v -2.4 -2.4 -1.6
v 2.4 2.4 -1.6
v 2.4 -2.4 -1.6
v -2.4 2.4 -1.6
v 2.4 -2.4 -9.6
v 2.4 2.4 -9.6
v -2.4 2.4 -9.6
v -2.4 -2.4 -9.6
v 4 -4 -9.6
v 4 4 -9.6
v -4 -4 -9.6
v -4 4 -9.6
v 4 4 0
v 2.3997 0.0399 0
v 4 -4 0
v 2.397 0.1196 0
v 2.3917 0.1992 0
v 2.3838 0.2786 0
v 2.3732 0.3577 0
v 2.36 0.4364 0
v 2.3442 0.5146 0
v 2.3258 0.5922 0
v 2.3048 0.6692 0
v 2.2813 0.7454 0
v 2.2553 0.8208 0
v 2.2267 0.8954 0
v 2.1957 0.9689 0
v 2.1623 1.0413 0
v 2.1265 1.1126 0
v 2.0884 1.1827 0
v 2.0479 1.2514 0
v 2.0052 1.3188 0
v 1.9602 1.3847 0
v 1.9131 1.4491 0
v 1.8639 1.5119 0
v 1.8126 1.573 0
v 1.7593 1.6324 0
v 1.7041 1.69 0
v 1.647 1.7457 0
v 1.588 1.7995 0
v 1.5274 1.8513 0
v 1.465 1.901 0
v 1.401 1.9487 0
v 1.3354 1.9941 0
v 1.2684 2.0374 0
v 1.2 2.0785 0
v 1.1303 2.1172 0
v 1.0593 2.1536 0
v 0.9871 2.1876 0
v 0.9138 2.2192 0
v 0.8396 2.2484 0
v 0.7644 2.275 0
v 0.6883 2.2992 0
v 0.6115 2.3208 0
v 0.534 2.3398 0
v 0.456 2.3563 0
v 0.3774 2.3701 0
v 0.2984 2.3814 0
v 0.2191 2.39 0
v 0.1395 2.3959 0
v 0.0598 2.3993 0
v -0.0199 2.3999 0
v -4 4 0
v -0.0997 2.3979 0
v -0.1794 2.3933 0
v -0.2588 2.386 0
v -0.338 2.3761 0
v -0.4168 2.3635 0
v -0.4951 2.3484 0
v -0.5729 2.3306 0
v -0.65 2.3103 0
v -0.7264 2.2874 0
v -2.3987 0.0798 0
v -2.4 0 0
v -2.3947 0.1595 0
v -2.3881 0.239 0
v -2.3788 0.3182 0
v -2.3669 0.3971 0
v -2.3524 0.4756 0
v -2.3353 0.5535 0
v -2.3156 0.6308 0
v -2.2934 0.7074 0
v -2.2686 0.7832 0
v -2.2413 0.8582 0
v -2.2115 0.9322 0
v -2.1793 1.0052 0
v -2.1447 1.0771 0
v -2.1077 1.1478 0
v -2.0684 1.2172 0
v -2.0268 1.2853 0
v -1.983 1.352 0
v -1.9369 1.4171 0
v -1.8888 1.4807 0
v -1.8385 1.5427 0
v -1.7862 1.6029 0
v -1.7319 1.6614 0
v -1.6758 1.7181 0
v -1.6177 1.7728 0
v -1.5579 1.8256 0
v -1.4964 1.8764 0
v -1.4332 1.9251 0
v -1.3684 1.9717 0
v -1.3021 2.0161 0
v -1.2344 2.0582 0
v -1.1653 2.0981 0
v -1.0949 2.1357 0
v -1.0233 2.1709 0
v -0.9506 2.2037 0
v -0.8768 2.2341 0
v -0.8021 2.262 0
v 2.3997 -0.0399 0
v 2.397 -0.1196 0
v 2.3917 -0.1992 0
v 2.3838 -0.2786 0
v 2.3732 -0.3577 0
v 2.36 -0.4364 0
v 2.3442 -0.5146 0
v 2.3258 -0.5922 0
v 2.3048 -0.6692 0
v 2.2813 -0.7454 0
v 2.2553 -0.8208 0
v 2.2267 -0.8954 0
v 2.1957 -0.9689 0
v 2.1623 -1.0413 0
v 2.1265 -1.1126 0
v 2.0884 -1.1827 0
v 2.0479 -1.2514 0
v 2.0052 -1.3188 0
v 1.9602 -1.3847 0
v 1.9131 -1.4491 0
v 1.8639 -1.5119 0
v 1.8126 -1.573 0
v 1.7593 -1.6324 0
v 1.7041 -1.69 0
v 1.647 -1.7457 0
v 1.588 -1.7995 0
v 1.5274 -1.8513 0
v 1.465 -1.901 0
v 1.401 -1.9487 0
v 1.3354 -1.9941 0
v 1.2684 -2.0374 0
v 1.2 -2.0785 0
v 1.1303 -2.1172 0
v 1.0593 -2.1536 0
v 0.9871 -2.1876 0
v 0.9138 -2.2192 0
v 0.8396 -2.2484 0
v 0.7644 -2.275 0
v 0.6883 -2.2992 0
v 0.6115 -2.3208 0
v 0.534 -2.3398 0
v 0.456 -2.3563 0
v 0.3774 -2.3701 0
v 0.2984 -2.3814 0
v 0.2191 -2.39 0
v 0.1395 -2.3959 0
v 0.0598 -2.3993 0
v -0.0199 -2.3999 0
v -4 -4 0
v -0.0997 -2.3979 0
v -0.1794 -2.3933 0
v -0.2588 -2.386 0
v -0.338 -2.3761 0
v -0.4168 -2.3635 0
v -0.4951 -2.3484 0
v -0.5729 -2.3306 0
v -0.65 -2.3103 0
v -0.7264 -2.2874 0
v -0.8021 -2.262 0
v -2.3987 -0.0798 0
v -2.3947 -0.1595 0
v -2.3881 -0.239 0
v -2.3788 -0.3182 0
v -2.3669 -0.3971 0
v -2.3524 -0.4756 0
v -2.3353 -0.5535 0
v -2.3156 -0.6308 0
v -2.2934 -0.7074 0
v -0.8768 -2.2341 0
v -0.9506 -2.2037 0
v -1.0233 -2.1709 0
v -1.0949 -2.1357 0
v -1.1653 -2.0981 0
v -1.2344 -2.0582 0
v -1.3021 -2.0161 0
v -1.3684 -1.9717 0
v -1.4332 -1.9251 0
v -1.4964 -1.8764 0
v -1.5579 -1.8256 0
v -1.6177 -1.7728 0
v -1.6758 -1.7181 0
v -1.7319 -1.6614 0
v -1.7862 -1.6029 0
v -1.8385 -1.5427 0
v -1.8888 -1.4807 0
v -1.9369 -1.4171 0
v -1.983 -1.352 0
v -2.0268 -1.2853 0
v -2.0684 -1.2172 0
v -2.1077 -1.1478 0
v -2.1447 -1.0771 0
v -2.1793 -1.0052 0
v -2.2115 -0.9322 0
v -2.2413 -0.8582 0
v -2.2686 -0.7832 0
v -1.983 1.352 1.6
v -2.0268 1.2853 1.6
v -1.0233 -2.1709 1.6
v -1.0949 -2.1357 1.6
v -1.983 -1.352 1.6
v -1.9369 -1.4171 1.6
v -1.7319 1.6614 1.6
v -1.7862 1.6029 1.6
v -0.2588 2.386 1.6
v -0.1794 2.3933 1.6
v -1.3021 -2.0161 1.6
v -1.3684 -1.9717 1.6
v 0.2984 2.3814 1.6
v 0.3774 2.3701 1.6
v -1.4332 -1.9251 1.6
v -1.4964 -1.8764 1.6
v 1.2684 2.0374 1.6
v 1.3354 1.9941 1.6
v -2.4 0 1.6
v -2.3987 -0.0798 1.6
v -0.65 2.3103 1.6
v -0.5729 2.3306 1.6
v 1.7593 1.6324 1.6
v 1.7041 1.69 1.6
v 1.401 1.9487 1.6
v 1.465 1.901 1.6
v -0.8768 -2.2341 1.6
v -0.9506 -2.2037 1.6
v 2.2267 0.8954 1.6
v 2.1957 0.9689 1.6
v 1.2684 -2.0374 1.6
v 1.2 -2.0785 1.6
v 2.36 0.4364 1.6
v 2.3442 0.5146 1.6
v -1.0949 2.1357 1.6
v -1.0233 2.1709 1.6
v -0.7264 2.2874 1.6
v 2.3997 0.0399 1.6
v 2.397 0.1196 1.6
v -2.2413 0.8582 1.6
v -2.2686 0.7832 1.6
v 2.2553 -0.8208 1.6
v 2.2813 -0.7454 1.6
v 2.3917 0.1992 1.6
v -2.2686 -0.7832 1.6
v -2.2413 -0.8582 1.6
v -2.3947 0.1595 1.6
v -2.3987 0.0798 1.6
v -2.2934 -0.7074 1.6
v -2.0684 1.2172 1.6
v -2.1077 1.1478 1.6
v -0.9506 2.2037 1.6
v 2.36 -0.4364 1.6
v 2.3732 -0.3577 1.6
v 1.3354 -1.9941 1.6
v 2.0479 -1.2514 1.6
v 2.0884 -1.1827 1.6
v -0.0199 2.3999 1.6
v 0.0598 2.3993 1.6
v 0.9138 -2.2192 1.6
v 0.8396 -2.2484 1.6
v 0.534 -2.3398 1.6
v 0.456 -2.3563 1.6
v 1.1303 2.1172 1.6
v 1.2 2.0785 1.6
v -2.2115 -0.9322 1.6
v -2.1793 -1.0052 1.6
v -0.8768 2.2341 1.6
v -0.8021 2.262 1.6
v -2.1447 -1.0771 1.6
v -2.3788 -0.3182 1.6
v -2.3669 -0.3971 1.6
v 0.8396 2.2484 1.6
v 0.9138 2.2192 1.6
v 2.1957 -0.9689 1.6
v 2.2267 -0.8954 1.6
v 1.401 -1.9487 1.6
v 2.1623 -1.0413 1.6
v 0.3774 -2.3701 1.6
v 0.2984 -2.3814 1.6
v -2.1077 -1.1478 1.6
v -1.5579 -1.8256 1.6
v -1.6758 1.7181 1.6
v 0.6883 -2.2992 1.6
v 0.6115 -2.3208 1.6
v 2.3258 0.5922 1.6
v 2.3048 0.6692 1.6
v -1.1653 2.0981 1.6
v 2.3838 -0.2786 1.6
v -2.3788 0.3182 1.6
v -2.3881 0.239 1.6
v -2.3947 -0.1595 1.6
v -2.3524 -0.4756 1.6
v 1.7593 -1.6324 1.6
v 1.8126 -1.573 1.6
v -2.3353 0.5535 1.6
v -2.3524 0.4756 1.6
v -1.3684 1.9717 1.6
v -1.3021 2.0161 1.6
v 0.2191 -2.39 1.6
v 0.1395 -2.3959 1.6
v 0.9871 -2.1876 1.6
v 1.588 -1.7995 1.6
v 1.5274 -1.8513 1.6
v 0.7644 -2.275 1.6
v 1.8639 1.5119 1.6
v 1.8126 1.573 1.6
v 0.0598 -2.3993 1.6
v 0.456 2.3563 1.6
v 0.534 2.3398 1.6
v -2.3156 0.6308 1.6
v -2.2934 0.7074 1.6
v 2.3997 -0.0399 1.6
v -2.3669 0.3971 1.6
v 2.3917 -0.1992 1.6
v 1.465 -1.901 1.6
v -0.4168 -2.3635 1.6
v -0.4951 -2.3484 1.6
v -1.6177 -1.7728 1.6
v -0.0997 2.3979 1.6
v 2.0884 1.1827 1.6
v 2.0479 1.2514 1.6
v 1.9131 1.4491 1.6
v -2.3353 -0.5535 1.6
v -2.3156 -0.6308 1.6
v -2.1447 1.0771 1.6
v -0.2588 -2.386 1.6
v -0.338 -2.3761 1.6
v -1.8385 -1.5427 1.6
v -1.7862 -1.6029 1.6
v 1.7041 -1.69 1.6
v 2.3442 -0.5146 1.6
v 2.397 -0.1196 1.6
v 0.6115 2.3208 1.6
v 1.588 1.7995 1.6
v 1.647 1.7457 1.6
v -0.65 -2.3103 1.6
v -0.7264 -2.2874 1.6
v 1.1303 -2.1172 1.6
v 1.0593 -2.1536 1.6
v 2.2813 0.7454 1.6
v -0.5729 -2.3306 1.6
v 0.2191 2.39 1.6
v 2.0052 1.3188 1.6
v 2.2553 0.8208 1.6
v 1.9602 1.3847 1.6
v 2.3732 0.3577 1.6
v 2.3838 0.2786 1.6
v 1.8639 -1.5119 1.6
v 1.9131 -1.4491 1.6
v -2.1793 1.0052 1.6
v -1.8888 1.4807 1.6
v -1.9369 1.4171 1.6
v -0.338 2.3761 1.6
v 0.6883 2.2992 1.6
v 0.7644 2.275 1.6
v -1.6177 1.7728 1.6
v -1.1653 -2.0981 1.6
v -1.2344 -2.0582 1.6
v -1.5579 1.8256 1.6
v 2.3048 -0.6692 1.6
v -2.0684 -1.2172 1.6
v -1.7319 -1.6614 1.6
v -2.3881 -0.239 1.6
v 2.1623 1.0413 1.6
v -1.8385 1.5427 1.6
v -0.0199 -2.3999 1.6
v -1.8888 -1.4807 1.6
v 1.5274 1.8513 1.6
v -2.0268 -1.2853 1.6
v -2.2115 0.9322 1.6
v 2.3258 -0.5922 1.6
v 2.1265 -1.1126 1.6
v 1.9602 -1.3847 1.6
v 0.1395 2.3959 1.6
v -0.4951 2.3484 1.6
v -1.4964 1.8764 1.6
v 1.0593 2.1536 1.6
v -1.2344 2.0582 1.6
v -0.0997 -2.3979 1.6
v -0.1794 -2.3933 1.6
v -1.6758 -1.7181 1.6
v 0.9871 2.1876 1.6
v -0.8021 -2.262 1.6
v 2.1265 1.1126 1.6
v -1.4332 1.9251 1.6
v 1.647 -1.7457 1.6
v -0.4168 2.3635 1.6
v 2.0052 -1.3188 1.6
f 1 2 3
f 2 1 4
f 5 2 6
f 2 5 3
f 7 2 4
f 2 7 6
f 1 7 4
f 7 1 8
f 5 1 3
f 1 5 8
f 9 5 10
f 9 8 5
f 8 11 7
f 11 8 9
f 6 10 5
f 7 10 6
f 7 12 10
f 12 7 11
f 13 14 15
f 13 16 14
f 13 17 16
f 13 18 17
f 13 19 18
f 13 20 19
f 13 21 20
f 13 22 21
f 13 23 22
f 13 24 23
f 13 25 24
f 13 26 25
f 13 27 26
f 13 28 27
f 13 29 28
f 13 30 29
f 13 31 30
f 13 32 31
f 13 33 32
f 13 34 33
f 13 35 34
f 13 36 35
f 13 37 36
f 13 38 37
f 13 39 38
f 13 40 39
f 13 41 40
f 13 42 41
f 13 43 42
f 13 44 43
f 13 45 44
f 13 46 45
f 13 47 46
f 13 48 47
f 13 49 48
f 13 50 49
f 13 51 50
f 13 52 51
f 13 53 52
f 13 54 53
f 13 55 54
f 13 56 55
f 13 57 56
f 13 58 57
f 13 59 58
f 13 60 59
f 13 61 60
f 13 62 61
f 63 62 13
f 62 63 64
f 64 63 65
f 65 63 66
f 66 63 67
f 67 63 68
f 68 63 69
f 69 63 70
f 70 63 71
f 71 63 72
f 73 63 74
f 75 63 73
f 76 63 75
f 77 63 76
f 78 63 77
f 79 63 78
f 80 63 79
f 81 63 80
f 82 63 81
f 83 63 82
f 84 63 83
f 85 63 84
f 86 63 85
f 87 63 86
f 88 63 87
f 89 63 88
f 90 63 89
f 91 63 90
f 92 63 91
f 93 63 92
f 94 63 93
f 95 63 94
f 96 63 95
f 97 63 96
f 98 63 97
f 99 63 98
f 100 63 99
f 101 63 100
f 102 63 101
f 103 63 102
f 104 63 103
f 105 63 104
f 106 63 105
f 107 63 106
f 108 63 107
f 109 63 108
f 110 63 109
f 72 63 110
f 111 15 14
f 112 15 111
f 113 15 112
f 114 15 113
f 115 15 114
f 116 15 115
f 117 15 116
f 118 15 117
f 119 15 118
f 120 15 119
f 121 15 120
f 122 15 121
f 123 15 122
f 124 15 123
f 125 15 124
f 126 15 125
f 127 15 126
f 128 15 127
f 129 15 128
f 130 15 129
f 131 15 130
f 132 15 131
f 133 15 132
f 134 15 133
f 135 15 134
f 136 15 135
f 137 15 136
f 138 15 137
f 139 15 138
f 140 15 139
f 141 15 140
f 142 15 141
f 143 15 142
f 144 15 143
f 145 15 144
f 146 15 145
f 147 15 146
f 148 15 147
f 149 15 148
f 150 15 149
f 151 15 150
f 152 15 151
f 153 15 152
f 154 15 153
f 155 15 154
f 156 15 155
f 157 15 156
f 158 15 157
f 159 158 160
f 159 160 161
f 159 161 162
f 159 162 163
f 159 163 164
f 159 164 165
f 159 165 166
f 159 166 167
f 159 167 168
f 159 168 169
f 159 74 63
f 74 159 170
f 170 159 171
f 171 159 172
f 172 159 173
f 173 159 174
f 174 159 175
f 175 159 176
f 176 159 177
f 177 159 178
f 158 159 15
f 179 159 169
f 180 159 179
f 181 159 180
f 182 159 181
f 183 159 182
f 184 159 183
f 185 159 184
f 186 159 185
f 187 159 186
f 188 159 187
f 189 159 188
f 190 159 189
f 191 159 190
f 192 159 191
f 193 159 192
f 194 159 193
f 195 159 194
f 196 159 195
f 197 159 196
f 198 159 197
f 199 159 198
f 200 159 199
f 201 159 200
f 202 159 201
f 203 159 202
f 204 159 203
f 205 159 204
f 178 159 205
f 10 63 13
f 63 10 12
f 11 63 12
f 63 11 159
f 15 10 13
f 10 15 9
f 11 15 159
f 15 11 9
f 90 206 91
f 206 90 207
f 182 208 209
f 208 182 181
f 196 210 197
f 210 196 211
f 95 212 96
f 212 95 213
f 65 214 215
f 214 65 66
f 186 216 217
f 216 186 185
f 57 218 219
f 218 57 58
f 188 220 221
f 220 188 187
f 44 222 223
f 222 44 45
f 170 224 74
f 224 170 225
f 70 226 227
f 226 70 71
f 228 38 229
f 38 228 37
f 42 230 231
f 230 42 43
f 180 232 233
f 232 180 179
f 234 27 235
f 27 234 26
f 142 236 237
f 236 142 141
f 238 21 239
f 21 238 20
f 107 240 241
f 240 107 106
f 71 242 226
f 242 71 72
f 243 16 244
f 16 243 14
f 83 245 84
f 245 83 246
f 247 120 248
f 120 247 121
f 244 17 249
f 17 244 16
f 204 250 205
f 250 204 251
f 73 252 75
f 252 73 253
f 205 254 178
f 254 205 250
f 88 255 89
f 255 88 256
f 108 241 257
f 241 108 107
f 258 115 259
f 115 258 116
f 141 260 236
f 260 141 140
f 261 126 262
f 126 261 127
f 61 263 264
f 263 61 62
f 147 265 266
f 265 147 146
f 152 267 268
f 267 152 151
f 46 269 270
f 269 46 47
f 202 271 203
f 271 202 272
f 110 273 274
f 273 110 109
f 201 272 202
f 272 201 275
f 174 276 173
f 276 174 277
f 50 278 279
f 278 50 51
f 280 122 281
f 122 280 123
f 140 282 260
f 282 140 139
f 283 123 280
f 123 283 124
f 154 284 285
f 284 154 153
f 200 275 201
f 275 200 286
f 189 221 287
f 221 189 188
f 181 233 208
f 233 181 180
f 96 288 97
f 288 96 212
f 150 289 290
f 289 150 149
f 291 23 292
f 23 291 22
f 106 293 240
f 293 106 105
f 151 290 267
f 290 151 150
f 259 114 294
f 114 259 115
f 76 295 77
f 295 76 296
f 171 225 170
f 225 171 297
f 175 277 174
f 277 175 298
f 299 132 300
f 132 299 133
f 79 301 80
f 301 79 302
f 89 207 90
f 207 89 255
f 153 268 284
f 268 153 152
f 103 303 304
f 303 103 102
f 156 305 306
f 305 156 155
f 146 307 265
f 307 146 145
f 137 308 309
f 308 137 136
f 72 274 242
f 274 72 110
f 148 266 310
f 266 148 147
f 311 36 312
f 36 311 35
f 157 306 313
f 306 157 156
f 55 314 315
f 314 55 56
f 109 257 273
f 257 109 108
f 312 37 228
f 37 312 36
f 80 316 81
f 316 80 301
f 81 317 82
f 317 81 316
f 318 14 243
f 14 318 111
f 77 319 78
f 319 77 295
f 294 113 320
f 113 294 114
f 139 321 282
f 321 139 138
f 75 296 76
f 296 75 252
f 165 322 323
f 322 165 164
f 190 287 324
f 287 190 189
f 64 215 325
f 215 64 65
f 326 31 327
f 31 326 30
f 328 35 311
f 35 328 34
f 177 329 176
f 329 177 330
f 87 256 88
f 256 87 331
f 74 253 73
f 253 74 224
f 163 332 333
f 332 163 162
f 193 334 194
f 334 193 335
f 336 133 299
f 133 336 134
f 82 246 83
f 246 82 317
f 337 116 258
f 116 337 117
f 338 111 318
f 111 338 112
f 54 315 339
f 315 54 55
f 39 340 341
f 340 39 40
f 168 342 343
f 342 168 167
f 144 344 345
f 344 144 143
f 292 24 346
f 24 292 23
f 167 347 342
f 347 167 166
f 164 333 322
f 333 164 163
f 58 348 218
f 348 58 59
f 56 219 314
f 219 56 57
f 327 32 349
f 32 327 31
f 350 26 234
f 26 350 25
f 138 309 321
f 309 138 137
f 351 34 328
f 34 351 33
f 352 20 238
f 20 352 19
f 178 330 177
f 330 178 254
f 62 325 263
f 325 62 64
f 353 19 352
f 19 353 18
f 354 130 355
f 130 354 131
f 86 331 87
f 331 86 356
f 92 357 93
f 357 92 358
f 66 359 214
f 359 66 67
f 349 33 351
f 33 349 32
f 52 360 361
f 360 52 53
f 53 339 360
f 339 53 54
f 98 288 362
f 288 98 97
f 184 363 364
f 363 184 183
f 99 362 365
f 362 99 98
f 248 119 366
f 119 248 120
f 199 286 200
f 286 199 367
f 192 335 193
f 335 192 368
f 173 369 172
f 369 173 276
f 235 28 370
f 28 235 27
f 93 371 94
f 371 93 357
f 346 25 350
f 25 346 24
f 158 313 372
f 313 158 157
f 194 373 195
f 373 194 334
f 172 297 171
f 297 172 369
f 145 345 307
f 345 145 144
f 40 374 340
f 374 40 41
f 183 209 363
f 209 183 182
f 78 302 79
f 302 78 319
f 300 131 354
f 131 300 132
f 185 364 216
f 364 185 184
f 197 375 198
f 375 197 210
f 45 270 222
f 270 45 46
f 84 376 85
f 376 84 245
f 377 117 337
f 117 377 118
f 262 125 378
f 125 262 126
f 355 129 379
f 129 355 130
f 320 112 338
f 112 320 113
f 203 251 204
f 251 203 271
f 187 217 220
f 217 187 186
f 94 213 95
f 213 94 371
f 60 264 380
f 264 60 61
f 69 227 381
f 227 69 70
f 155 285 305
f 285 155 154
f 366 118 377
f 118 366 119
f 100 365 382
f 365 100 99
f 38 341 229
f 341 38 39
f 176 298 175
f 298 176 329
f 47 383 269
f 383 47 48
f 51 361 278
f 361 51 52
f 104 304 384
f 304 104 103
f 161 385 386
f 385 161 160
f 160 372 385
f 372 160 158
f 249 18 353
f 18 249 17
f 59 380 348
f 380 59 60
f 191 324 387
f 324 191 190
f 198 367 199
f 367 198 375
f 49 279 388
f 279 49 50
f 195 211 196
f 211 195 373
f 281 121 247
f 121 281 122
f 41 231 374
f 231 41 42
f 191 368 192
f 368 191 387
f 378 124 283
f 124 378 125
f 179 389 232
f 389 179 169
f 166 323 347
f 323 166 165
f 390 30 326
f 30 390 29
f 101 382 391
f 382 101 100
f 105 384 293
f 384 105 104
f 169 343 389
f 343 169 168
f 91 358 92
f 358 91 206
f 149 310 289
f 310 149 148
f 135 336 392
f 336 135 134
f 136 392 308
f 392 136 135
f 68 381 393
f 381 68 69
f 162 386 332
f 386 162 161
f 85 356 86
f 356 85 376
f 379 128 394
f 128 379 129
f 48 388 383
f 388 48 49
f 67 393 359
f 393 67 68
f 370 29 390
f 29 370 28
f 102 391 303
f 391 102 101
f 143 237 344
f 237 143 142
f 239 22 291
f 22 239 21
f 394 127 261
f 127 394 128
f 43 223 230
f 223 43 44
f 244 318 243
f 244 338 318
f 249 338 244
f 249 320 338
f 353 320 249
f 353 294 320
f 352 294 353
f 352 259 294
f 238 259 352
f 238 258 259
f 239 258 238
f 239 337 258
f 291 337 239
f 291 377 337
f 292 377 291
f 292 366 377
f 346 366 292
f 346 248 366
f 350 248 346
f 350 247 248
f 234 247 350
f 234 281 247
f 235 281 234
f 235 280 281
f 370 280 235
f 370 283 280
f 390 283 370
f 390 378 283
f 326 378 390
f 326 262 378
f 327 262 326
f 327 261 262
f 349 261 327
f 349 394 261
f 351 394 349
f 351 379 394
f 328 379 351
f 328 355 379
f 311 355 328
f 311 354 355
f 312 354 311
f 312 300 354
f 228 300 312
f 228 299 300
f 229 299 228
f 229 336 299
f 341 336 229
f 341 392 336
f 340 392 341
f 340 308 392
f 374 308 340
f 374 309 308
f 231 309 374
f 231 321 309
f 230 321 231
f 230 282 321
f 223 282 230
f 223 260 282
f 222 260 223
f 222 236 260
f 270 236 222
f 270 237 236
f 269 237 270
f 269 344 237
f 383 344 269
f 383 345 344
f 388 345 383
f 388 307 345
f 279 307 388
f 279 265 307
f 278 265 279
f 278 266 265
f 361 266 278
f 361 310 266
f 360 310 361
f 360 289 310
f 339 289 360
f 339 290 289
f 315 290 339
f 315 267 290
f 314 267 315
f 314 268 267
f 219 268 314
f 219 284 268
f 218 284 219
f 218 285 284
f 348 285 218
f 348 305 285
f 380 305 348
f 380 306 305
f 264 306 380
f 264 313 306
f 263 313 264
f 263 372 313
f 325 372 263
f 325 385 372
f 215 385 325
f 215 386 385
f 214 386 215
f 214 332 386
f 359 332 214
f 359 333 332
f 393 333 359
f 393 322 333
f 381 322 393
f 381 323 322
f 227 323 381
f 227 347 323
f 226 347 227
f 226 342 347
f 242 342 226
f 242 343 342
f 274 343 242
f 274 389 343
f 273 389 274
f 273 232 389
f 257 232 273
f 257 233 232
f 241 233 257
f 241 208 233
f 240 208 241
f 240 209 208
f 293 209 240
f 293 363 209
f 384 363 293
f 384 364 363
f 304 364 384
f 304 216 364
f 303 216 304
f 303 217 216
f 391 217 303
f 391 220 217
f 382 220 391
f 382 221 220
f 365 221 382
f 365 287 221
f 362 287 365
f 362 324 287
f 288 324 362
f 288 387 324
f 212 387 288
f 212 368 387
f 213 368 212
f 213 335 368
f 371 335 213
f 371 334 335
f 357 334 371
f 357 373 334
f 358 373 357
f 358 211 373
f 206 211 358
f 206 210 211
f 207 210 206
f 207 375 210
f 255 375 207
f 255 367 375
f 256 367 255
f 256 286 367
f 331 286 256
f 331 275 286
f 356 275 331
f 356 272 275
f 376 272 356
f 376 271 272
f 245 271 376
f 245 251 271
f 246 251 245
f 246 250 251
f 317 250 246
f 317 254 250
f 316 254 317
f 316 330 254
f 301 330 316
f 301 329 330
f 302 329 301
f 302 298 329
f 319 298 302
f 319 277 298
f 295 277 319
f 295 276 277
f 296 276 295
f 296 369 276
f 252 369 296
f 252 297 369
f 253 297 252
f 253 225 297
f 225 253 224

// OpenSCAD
// file: ../p/4-4edge.scad
use <../lib.scad>
$fa=1; $fs=0.2;
function ldraw_lib__4_4edge(realsolid=false) = [
// 0 Circle 1.0
// 0 Name: 4-4edge.dat
// 0 Author: James Jessiman
// 0 !LDRAW_ORG Primitive UPDATE 2017-01
// 0 !LICENSE Licensed under CC BY 2.0 and CC BY 4.0 : see CAreadme.txt
// 
// 0 BFC CERTIFY CCW
  [0,"BFC","CERTIFY"],
  [0,"BFC","CCW"],
// 
// 0 !HISTORY 1998-12-15 [PTadmin] Official Update 1998-10
// 0 !HISTORY 2005-12-28 [PTadmin] Official Update 2005-01
// 0 !HISTORY 2007-06-24 [PTadmin] Header formatted for Contributor Agreement
// 0 !HISTORY 2008-07-01 [PTadmin] Official Update 2008-01
// 0 !HISTORY 2017-01-15 [Steffen] BFCed
// 0 !HISTORY 2017-12-30 [PTadmin] Official Update 2017-01
// 
// 
// 2 24 1 0 0 0.9239 0 0.3827
  [2,24,1,0,0,0.9239,0,0.3827],
// 2 24 0.9239 0 0.3827 0.7071 0 0.7071
  [2,24,0.9239,0,0.3827,0.7071,0,0.7071],
// 2 24 0.7071 0 0.7071 0.3827 0 0.9239
  [2,24,0.7071,0,0.7071,0.3827,0,0.9239],
// 2 24 0.3827 0 0.9239 0 0 1
  [2,24,0.3827,0,0.9239,0,0,1],
// 2 24 0 0 1 -0.3827 0 0.9239
  [2,24,0,0,1,-0.3827,0,0.9239],
// 2 24 -0.3827 0 0.9239 -0.7071 0 0.7071
  [2,24,-0.3827,0,0.9239,-0.7071,0,0.7071],
// 2 24 -0.7071 0 0.7071 -0.9239 0 0.3827
  [2,24,-0.7071,0,0.7071,-0.9239,0,0.3827],
// 2 24 -0.9239 0 0.3827 -1 0 -0
  [2,24,-0.9239,0,0.3827,-1,0,-0],
// 2 24 -1 0 -0 -0.9239 0 -0.3827
  [2,24,-1,0,-0,-0.9239,0,-0.3827],
// 2 24 -0.9239 0 -0.3827 -0.7071 0 -0.7071
  [2,24,-0.9239,0,-0.3827,-0.7071,0,-0.7071],
// 2 24 -0.7071 0 -0.7071 -0.3827 0 -0.9239
  [2,24,-0.7071,0,-0.7071,-0.3827,0,-0.9239],
// 2 24 -0.3827 0 -0.9239 0 0 -1
  [2,24,-0.3827,0,-0.9239,0,0,-1],
// 2 24 0 0 -1 0.3827 0 -0.9239
  [2,24,0,0,-1,0.3827,0,-0.9239],
// 2 24 0.3827 0 -0.9239 0.7071 0 -0.7071
  [2,24,0.3827,0,-0.9239,0.7071,0,-0.7071],
// 2 24 0.7071 0 -0.7071 0.9239 0 -0.3827
  [2,24,0.7071,0,-0.7071,0.9239,0,-0.3827],
// 2 24 0.9239 0 -0.3827 1 0 0
  [2,24,0.9239,0,-0.3827,1,0,0],
];
module ldraw_lib__4_4edge(step=0, col=false, unit=2/5, alt=false, line=0.2, solid=!$preview)
    makepoly(ldraw_lib__4_4edge(solid), step=step, col=col, unit=unit, alt=alt, line=line, solid=solid);
ldraw_lib__4_4edge(line=0.2);
// file: ../p/4-4disc.scad
use <../lib.scad>
$fa=1; $fs=0.2;
function ldraw_lib__4_4disc(realsolid=false) = [
// 0 Disc 1.0
// 0 Name: 4-4disc.dat
// 0 Author: James Jessiman
// 0 !LDRAW_ORG Primitive UPDATE 2002-02
// 0 !LICENSE Licensed under CC BY 2.0 and CC BY 4.0 : see CAreadme.txt
// 
// 0 BFC CERTIFY CCW
  [0,"BFC","CERTIFY"],
  [0,"BFC","CCW"],
// 
// 0 !HISTORY 1998-12-15 [PTadmin] Official Update 1998-10
// 0 !HISTORY 2002-03-23 [sbliss] Added BFC statement
// 0 !HISTORY 2002-04-25 [PTadmin] Official Update 2002-02
// 0 !HISTORY 2007-06-24 [PTadmin] Header formatted for Contributor Agreement
// 0 !HISTORY 2008-07-01 [PTadmin] Official Update 2008-01
// 
// 
// 3 16 0 0 0 1 0 0 0.9239 0 0.3827
  [3,16,0,0,0,1,0,0,0.9239,0,0.3827],
// 3 16 0 0 0 0.9239 0 0.3827 0.7071 0 0.7071
  [3,16,0,0,0,0.9239,0,0.3827,0.7071,0,0.7071],
// 3 16 0 0 0 0.7071 0 0.7071 0.3827 0 0.9239
  [3,16,0,0,0,0.7071,0,0.7071,0.3827,0,0.9239],
// 3 16 0 0 0 0.3827 0 0.9239 0 0 1
  [3,16,0,0,0,0.3827,0,0.9239,0,0,1],
// 3 16 0 0 0 0 0 1 -0.3827 0 0.9239
  [3,16,0,0,0,0,0,1,-0.3827,0,0.9239],
// 3 16 0 0 0 -0.3827 0 0.9239 -0.7071 0 0.7071
  [3,16,0,0,0,-0.3827,0,0.9239,-0.7071,0,0.7071],
// 3 16 0 0 0 -0.7071 0 0.7071 -0.9239 0 0.3827
  [3,16,0,0,0,-0.7071,0,0.7071,-0.9239,0,0.3827],
// 3 16 0 0 0 -0.9239 0 0.3827 -1 0 -0
  [3,16,0,0,0,-0.9239,0,0.3827,-1,0,-0],
// 3 16 0 0 0 -1 0 -0 -0.9239 0 -0.3827
  [3,16,0,0,0,-1,0,-0,-0.9239,0,-0.3827],
// 3 16 0 0 0 -0.9239 0 -0.3827 -0.7071 0 -0.7071
  [3,16,0,0,0,-0.9239,0,-0.3827,-0.7071,0,-0.7071],
// 3 16 0 0 0 -0.7071 0 -0.7071 -0.3827 0 -0.9239
  [3,16,0,0,0,-0.7071,0,-0.7071,-0.3827,0,-0.9239],
// 3 16 0 0 0 -0.3827 0 -0.9239 0 0 -1
  [3,16,0,0,0,-0.3827,0,-0.9239,0,0,-1],
// 3 16 0 0 0 0 0 -1 0.3827 0 -0.9239
  [3,16,0,0,0,0,0,-1,0.3827,0,-0.9239],
// 3 16 0 0 0 0.3827 0 -0.9239 0.7071 0 -0.7071
  [3,16,0,0,0,0.3827,0,-0.9239,0.7071,0,-0.7071],
// 3 16 0 0 0 0.7071 0 -0.7071 0.9239 0 -0.3827
  [3,16,0,0,0,0.7071,0,-0.7071,0.9239,0,-0.3827],
// 3 16 0 0 0 0.9239 0 -0.3827 1 0 0
  [3,16,0,0,0,0.9239,0,-0.3827,1,0,0],
// 0
];
module ldraw_lib__4_4disc(step=0, col=false, unit=2/5, alt=false, line=0.2, solid=!$preview)
    makepoly(ldraw_lib__4_4disc(solid), step=step, col=col, unit=unit, alt=alt, line=line, solid=solid);
ldraw_lib__4_4disc(line=0.2);
// file: ../p/4-4cyli.scad
use <../lib.scad>
$fa=1; $fs=0.2;
function ldraw_lib__4_4cyli(realsolid=false) = [
// 0 Cylinder 1.0
// 0 Name: 4-4cyli.dat
// 0 Author: James Jessiman
// 0 !LDRAW_ORG Primitive UPDATE 2005-01
// 0 !LICENSE Licensed under CC BY 2.0 and CC BY 4.0 : see CAreadme.txt
// 
// 0 BFC CERTIFY CCW
  [0,"BFC","CERTIFY"],
  [0,"BFC","CCW"],
// 
// 0 !HISTORY 1998-12-15 [PTadmin] Official Update 1998-10
// 0 !HISTORY 2002-03-23 [sbliss] Added BFC statement; merged headers from files in distributions LDraw 0.27 and Complete.
// 0 !HISTORY 2002-04-25 [PTadmin] Official Update 2002-02
// 0 !HISTORY 2004-12-14 [guyvivan] BFC CCW
// 0 !HISTORY 2005-12-28 [PTadmin] Official Update 2005-01
// 0 !HISTORY 2007-06-24 [PTadmin] Header formatted for Contributor Agreement
// 0 !HISTORY 2008-07-01 [PTadmin] Official Update 2008-01
// 
// 
// 4 16 1 1 0 0.9239 1 0.3827 0.9239 0 0.3827 1 0 0
  [4,16,1,1,0,0.9239,1,0.3827,0.9239,0,0.3827,1,0,0],
// 5 24 1 0 0 1 1 0 0.9239 0 0.3827 0.9239 0 -0.3827
  [5,24,1,0,0,1,1,0,0.9239,0,0.3827,0.9239,0,-0.3827],
// 4 16 0.9239 1 0.3827 0.7071 1 0.7071 0.7071 0 0.7071 0.9239 0 0.3827
  [4,16,0.9239,1,0.3827,0.7071,1,0.7071,0.7071,0,0.7071,0.9239,0,0.3827],
// 5 24 0.9239 0 0.3827 0.9239 1 0.3827 0.7071 0 0.7071 1 0 0
  [5,24,0.9239,0,0.3827,0.9239,1,0.3827,0.7071,0,0.7071,1,0,0],
// 4 16 0.7071 1 0.7071 0.3827 1 0.9239 0.3827 0 0.9239 0.7071 0 0.7071
  [4,16,0.7071,1,0.7071,0.3827,1,0.9239,0.3827,0,0.9239,0.7071,0,0.7071],
// 5 24 0.7071 0 0.7071 0.7071 1 0.7071 0.3827 0 0.9239 0.9239 0 0.3827
  [5,24,0.7071,0,0.7071,0.7071,1,0.7071,0.3827,0,0.9239,0.9239,0,0.3827],
// 4 16 0.3827 1 0.9239 0 1 1 0 0 1 0.3827 0 0.9239
  [4,16,0.3827,1,0.9239,0,1,1,0,0,1,0.3827,0,0.9239],
// 5 24 0.3827 0 0.9239 0.3827 1 0.9239 0 0 1 0.7071 0 0.7071
  [5,24,0.3827,0,0.9239,0.3827,1,0.9239,0,0,1,0.7071,0,0.7071],
// 4 16 0 1 1 -0.3827 1 0.9239 -0.3827 0 0.9239 0 0 1
  [4,16,0,1,1,-0.3827,1,0.9239,-0.3827,0,0.9239,0,0,1],
// 5 24 0 0 1 0 1 1 -0.3827 0 0.9239 0.3827 0 0.9239
  [5,24,0,0,1,0,1,1,-0.3827,0,0.9239,0.3827,0,0.9239],
// 4 16 -0.3827 1 0.9239 -0.7071 1 0.7071 -0.7071 0 0.7071 -0.3827 0 0.9239
  [4,16,-0.3827,1,0.9239,-0.7071,1,0.7071,-0.7071,0,0.7071,-0.3827,0,0.9239],
// 5 24 -0.3827 0 0.9239 -0.3827 1 0.9239 -0.7071 0 0.7071 0 0 1
  [5,24,-0.3827,0,0.9239,-0.3827,1,0.9239,-0.7071,0,0.7071,0,0,1],
// 4 16 -0.7071 1 0.7071 -0.9239 1 0.3827 -0.9239 0 0.3827 -0.7071 0 0.7071
  [4,16,-0.7071,1,0.7071,-0.9239,1,0.3827,-0.9239,0,0.3827,-0.7071,0,0.7071],
// 5 24 -0.7071 0 0.7071 -0.7071 1 0.7071 -0.9239 0 0.3827 -0.3827 0 0.9239
  [5,24,-0.7071,0,0.7071,-0.7071,1,0.7071,-0.9239,0,0.3827,-0.3827,0,0.9239],
// 4 16 -0.9239 1 0.3827 -1 1 0 -1 0 0 -0.9239 0 0.3827
  [4,16,-0.9239,1,0.3827,-1,1,0,-1,0,0,-0.9239,0,0.3827],
// 5 24 -0.9239 0 0.3827 -0.9239 1 0.3827 -1 0 0 -0.7071 0 0.7071
  [5,24,-0.9239,0,0.3827,-0.9239,1,0.3827,-1,0,0,-0.7071,0,0.7071],
// 4 16 -1 1 0 -0.9239 1 -0.3827 -0.9239 0 -0.3827 -1 0 0
  [4,16,-1,1,0,-0.9239,1,-0.3827,-0.9239,0,-0.3827,-1,0,0],
// 5 24 -1 0 0 -1 1 0 -0.9239 0 -0.3827 -0.9239 0 0.3827
  [5,24,-1,0,0,-1,1,0,-0.9239,0,-0.3827,-0.9239,0,0.3827],
// 4 16 -0.9239 1 -0.3827 -0.7071 1 -0.7071 -0.7071 0 -0.7071 -0.9239 0 -0.3827
  [4,16,-0.9239,1,-0.3827,-0.7071,1,-0.7071,-0.7071,0,-0.7071,-0.9239,0,-0.3827],
// 5 24 -0.9239 0 -0.3827 -0.9239 1 -0.3827 -0.7071 0 -0.7071 -1 0 0
  [5,24,-0.9239,0,-0.3827,-0.9239,1,-0.3827,-0.7071,0,-0.7071,-1,0,0],
// 4 16 -0.7071 1 -0.7071 -0.3827 1 -0.9239 -0.3827 0 -0.9239 -0.7071 0 -0.7071
  [4,16,-0.7071,1,-0.7071,-0.3827,1,-0.9239,-0.3827,0,-0.9239,-0.7071,0,-0.7071],
// 5 24 -0.7071 0 -0.7071 -0.7071 1 -0.7071 -0.3827 0 -0.9239 -0.9239 0 -0.3827
  [5,24,-0.7071,0,-0.7071,-0.7071,1,-0.7071,-0.3827,0,-0.9239,-0.9239,0,-0.3827],
// 4 16 -0.3827 1 -0.9239 0 1 -1 0 0 -1 -0.3827 0 -0.9239
  [4,16,-0.3827,1,-0.9239,0,1,-1,0,0,-1,-0.3827,0,-0.9239],
// 5 24 -0.3827 0 -0.9239 -0.3827 1 -0.9239 0 0 -1 -0.7071 0 -0.7071
  [5,24,-0.3827,0,-0.9239,-0.3827,1,-0.9239,0,0,-1,-0.7071,0,-0.7071],
// 4 16 0 1 -1 0.3827 1 -0.9239 0.3827 0 -0.9239 0 0 -1
  [4,16,0,1,-1,0.3827,1,-0.9239,0.3827,0,-0.9239,0,0,-1],
// 5 24 0 0 -1 0 1 -1 0.3827 0 -0.9239 -0.3827 0 -0.9239
  [5,24,0,0,-1,0,1,-1,0.3827,0,-0.9239,-0.3827,0,-0.9239],
// 4 16 0.3827 1 -0.9239 0.7071 1 -0.7071 0.7071 0 -0.7071 0.3827 0 -0.9239
  [4,16,0.3827,1,-0.9239,0.7071,1,-0.7071,0.7071,0,-0.7071,0.3827,0,-0.9239],
// 5 24 0.3827 0 -0.9239 0.3827 1 -0.9239 0.7071 0 -0.7071 0 0 -1
  [5,24,0.3827,0,-0.9239,0.3827,1,-0.9239,0.7071,0,-0.7071,0,0,-1],
// 4 16 0.7071 1 -0.7071 0.9239 1 -0.3827 0.9239 0 -0.3827 0.7071 0 -0.7071
  [4,16,0.7071,1,-0.7071,0.9239,1,-0.3827,0.9239,0,-0.3827,0.7071,0,-0.7071],
// 5 24 0.7071 0 -0.7071 0.7071 1 -0.7071 0.9239 0 -0.3827 0.3827 0 -0.9239
  [5,24,0.7071,0,-0.7071,0.7071,1,-0.7071,0.9239,0,-0.3827,0.3827,0,-0.9239],
// 4 16 0.9239 1 -0.3827 1 1 0 1 0 0 0.9239 0 -0.3827
  [4,16,0.9239,1,-0.3827,1,1,0,1,0,0,0.9239,0,-0.3827],
// 5 24 0.9239 0 -0.3827 0.9239 1 -0.3827 1 0 0 0.7071 0 -0.7071
  [5,24,0.9239,0,-0.3827,0.9239,1,-0.3827,1,0,0,0.7071,0,-0.7071],
// 0
];
module ldraw_lib__4_4cyli(step=0, col=false, unit=2/5, alt=false, line=0.2, solid=!$preview)
    makepoly(ldraw_lib__4_4cyli(solid), step=step, col=col, unit=unit, alt=alt, line=line, solid=solid);
ldraw_lib__4_4cyli(line=0.2);
// file: ../p/stud3.scad
use <../lib.scad>
use <4-4cyli.scad>
use <4-4disc.scad>
use <4-4edge.scad>
$fa=1; $fs=0.2;
function ldraw_lib__stud3(realsolid=false) = realsolid ? 
    [openscad(translate([0,0,-eps()], o=cylinder(4+eps(), r=4)),2)] : [
// 0 Stud Tube Solid
// 0 Name: stud3.dat
// 0 Author: James Jessiman
// 0 !LDRAW_ORG Primitive UPDATE 2012-01
// 0 !LICENSE Licensed under CC BY 2.0 and CC BY 4.0 : see CAreadme.txt
// 
// 0 BFC CERTIFY CCW
  [0,"BFC","CERTIFY"],
  [0,"BFC","CCW"],
// 
// 0 !HISTORY 2002-04-04 [sbliss] Modified for BFC compliance
// 0 !HISTORY 2002-04-25 [PTadmin] Official Update 2002-02
// 0 !HISTORY 2007-06-24 [PTadmin] Header formatted for Contributor Agreement
// 0 !HISTORY 2008-07-01 [PTadmin] Official Update 2008-01
// 0 !HISTORY 2012-02-16 [Philo] Changed to CCW
// 0 !HISTORY 2012-03-30 [PTadmin] Official Update 2012-01
// 
// 
// 1 16 0 -4 0 4 0 0 0 1 0 0 0 4 4-4edge.dat
  [1,16,0,-4,0,4,0,0,0,1,0,0,0,4, ldraw_lib__4_4edge(realsolid)],
// 1 16 0 0 0 4 0 0 0 1 0 0 0 4 4-4edge.dat
  [1,16,0,0,0,4,0,0,0,1,0,0,0,4, ldraw_lib__4_4edge(realsolid)],
// 1 16 0 -4 0 4 0 0 0 1 0 0 0 4 4-4disc.dat
  [1,16,0,-4,0,4,0,0,0,1,0,0,0,4, ldraw_lib__4_4disc(realsolid)],
// 1 16 0 -4 0 4 0 0 0 4 0 0 0 4 4-4cyli.dat
  [1,16,0,-4,0,4,0,0,0,4,0,0,0,4, ldraw_lib__4_4cyli(realsolid)],
];
module ldraw_lib__stud3(step=0, col=false, unit=2/5, alt=false, line=0.2, solid=!$preview)
    makepoly(ldraw_lib__stud3(solid), step=step, col=col, unit=unit, alt=alt, line=line, solid=solid);
ldraw_lib__stud3(line=0.2);
// file: ../p/stud.scad
use <../lib.scad>
use <4-4cyli.scad>
use <4-4disc.scad>
use <4-4edge.scad>
$fa=1; $fs=0.2;
function ldraw_lib__stud(realsolid=false) = realsolid ? 
    [openscad(translate([0,0,-eps()], o=cylinder(4+eps(), r=6)),2)] : [
// 0 Stud
// 0 Name: stud.dat
// 0 Author: James Jessiman
// 0 !LDRAW_ORG Primitive UPDATE 2012-01
// 0 !LICENSE Licensed under CC BY 2.0 and CC BY 4.0 : see CAreadme.txt
// 
// 0 BFC CERTIFY CCW
  [0,"BFC","CERTIFY"],
  [0,"BFC","CCW"],
// 
// 0 !HISTORY 2002-04-04 [sbliss] Modified for BFC compliance
// 0 !HISTORY 2002-04-25 [PTadmin] Official Update 2002-02
// 0 !HISTORY 2007-06-24 [PTadmin] Header formatted for Contributor Agreement
// 0 !HISTORY 2008-07-01 [PTadmin] Official Update 2008-01
// 0 !HISTORY 2012-02-16 [Philo] Changed to CCW
// 0 !HISTORY 2012-03-30 [PTadmin] Official Update 2012-01
// 
// 
// 1 16 0 0 0 6 0 0 0 1 0 0 0 6 4-4edge.dat
  [1,16,0,0,0,6,0,0,0,1,0,0,0,6, ldraw_lib__4_4edge(realsolid)],
// 1 16 0 -4 0 6 0 0 0 1 0 0 0 6 4-4edge.dat
  [1,16,0,-4,0,6,0,0,0,1,0,0,0,6, ldraw_lib__4_4edge(realsolid)],
// 1 16 0 0 0 6 0 0 0 -4 0 0 0 6 4-4cyli.dat
  [1,16,0,0,0,6,0,0,0,-4,0,0,0,6, ldraw_lib__4_4cyli(realsolid)],
// 1 16 0 -4 0 6 0 0 0 1 0 0 0 6 4-4disc.dat
  [1,16,0,-4,0,6,0,0,0,1,0,0,0,6, ldraw_lib__4_4disc(realsolid)],
];
module ldraw_lib__stud(step=0, col=false, unit=2/5, alt=false, line=0.2, solid=!$preview)
    makepoly(ldraw_lib__stud(solid), step=step, col=col, unit=unit, alt=alt, line=line, solid=solid);
ldraw_lib__stud(line=0.2);
// file: ../p/box5.scad
use <../lib.scad>
$fa=1; $fs=0.2;
function ldraw_lib__box5(realsolid=false) = [
// 0 Box with 5 Faces and All Edges
// 0 Name: box5.dat
// 0 Author: James Jessiman
// 0 !LDRAW_ORG Primitive UPDATE 2012-01
// 0 !LICENSE Licensed under CC BY 2.0 and CC BY 4.0 : see CAreadme.txt
// 
// 0 BFC CERTIFY CCW
  [0,"BFC","CERTIFY"],
  [0,"BFC","CCW"],
// 
// 0 !HISTORY 2002-04-03 [sbliss] Modified for BFC compliance
// 0 !HISTORY 2002-04-25 [PTadmin] Official Update 2002-02
// 0 !HISTORY 2007-06-24 [PTadmin] Header formatted for Contributor Agreement
// 0 !HISTORY 2008-07-01 [PTadmin] Official Update 2008-01
// 0 !HISTORY 2012-02-16 [Philo] Changed to CCW
// 0 !HISTORY 2012-03-30 [PTadmin] Official Update 2012-01
// 
// 
// 2 24 1 1 1 -1 1 1
  [2,24,1,1,1,-1,1,1],
// 2 24 -1 1 1 -1 1 -1
  [2,24,-1,1,1,-1,1,-1],
// 2 24 -1 1 -1 1 1 -1
  [2,24,-1,1,-1,1,1,-1],
// 2 24 1 1 -1 1 1 1
  [2,24,1,1,-1,1,1,1],
// 2 24 1 0 1 -1 0 1
  [2,24,1,0,1,-1,0,1],
// 2 24 -1 0 1 -1 0 -1
  [2,24,-1,0,1,-1,0,-1],
// 2 24 -1 0 -1 1 0 -1
  [2,24,-1,0,-1,1,0,-1],
// 2 24 1 0 -1 1 0 1
  [2,24,1,0,-1,1,0,1],
// 2 24 1 0 1 1 1 1
  [2,24,1,0,1,1,1,1],
// 2 24 -1 0 1 -1 1 1
  [2,24,-1,0,1,-1,1,1],
// 2 24 1 0 -1 1 1 -1
  [2,24,1,0,-1,1,1,-1],
// 2 24 -1 0 -1 -1 1 -1
  [2,24,-1,0,-1,-1,1,-1],
// 4 16 -1 1 1 1 1 1 1 1 -1 -1 1 -1
  [4,16,-1,1,1,1,1,1,1,1,-1,-1,1,-1],
// 4 16 -1 1 1 -1 0 1 1 0 1 1 1 1
  [4,16,-1,1,1,-1,0,1,1,0,1,1,1,1],
// 4 16 -1 1 -1 -1 0 -1 -1 0 1 -1 1 1
  [4,16,-1,1,-1,-1,0,-1,-1,0,1,-1,1,1],
// 4 16 1 1 -1 1 0 -1 -1 0 -1 -1 1 -1
  [4,16,1,1,-1,1,0,-1,-1,0,-1,-1,1,-1],
// 4 16 1 1 1 1 0 1 1 0 -1 1 1 -1
  [4,16,1,1,1,1,0,1,1,0,-1,1,1,-1],
];
module ldraw_lib__box5(step=0, col=false, unit=2/5, alt=false, line=0.2, solid=!$preview)
    makepoly(ldraw_lib__box5(solid), step=step, col=col, unit=unit, alt=alt, line=line, solid=solid);
ldraw_lib__box5(line=0.2);
// file: ../p/box4t.scad
use <../lib.scad>
$fa=1; $fs=0.2;
function ldraw_lib__box4t(realsolid=false) = [
// 0 Box with 4 Adjacent Faces and All Edges
// 0 Name: box4t.dat
// 0 Author: Tore Eriksson [Tore_Eriksson]
// 0 !LDRAW_ORG Primitive UPDATE 2003-02
// 0 !LICENSE Licensed under CC BY 2.0 and CC BY 4.0 : see CAreadme.txt
// 
// 0 BFC CERTIFY CCW
  [0,"BFC","CERTIFY"],
  [0,"BFC","CCW"],
// 
// 0 !HISTORY 1997-09-29 [PTadmin] Official Update 1997-15
// 0 !HISTORY 2002-08-31 [izanette] Modified with WINDZ for BFC compliance
// 0 !HISTORY 2003-08-01 [PTadmin] Official Update 2003-02
// 0 !HISTORY 2007-06-24 [PTadmin] Header formatted for Contributor Agreement
// 0 !HISTORY 2008-07-01 [PTadmin] Official Update 2008-01
// 
// 
// 2 24 1 1 1 -1 1 1
  [2,24,1,1,1,-1,1,1],
// 2 24 -1 1 1 -1 1 -1
  [2,24,-1,1,1,-1,1,-1],
// 2 24 -1 1 -1 1 1 -1
  [2,24,-1,1,-1,1,1,-1],
// 2 24 1 1 -1 1 1 1
  [2,24,1,1,-1,1,1,1],
// 2 24 1 0 1 -1 0 1
  [2,24,1,0,1,-1,0,1],
// 2 24 -1 0 1 -1 0 -1
  [2,24,-1,0,1,-1,0,-1],
// 2 24 -1 0 -1 1 0 -1
  [2,24,-1,0,-1,1,0,-1],
// 2 24 1 0 -1 1 0 1
  [2,24,1,0,-1,1,0,1],
// 2 24 1 0 1 1 1 1
  [2,24,1,0,1,1,1,1],
// 2 24 -1 0 1 -1 1 1
  [2,24,-1,0,1,-1,1,1],
// 2 24 1 0 -1 1 1 -1
  [2,24,1,0,-1,1,1,-1],
// 2 24 -1 0 -1 -1 1 -1
  [2,24,-1,0,-1,-1,1,-1],
// 4 16 1 1 1 1 1 -1 -1 1 -1 -1 1 1
  [4,16,1,1,1,1,1,-1,-1,1,-1,-1,1,1],
// 4 16 1 1 1 -1 1 1 -1 0 1 1 0 1
  [4,16,1,1,1,-1,1,1,-1,0,1,1,0,1],
// 4 16 -1 1 1 -1 1 -1 -1 0 -1 -1 0 1
  [4,16,-1,1,1,-1,1,-1,-1,0,-1,-1,0,1],
// 0 4 16 -1 1 -1 -1 0 -1 1 0 -1 1 1 -1
// 4 16 1 1 -1 1 1 1 1 0 1 1 0 -1
  [4,16,1,1,-1,1,1,1,1,0,1,1,0,-1],
// 0
];
module ldraw_lib__box4t(step=0, col=false, unit=2/5, alt=false, line=0.2, solid=!$preview)
    makepoly(ldraw_lib__box4t(solid), step=step, col=col, unit=unit, alt=alt, line=line, solid=solid);
ldraw_lib__box4t(line=0.2);
// file: s/3004s01.scad
use <../../lib.scad>
use <../../p/box4t.scad>
use <../../p/box5.scad>
use <../../p/stud.scad>
use <../../p/stud3.scad>
$fa=1; $fs=0.2;
function ldraw_lib__s__3004s01(realsolid=false) = [
// 0 ~Brick  1 x  2 without Front Face
// 0 Name: s\3004s01.dat
// 0 Author: James Jessiman
// 0 !LDRAW_ORG Subpart UPDATE 2003-03
// 0 !LICENSE Licensed under CC BY 2.0 and CC BY 4.0 : see CAreadme.txt
// 
// 0 BFC CERTIFY CCW
  [0,"BFC","CERTIFY"],
  [0,"BFC","CCW"],
// 
// 0 !HISTORY 2003-09-07 [jriley] Subfiling, BFC
// 0 !HISTORY 2003-12-19 [PTadmin] Official Update 2003-03
// 0 !HISTORY 2007-08-29 [PTadmin] Header formatted for Contributor Agreement
// 0 !HISTORY 2008-07-01 [PTadmin] Official Update 2008-01
// 
// 
// 1 16 0 4 0 1 0 0 0 -5 0 0 0 1 stud3.dat
  [1,16,0,4,0,1,0,0,0,-5,0,0,0,1, ldraw_lib__stud3(realsolid)],
// 0 BFC INVERTNEXT
  [0,"BFC","INVERTNEXT"],
// 1 16 0 24 0 16 0 0 0 -20 0 0 0 6 box5.dat
  [1,16,0,24,0,16,0,0,0,-20,0,0,0,6, ldraw_lib__box5(realsolid)],
// 4 16 20 24 10 16 24 6 -16 24 6 -20 24 10
  [4,16,20,24,10,16,24,6,-16,24,6,-20,24,10],
// 4 16 -20 24 10 -16 24 6 -16 24 -6 -20 24 -10
  [4,16,-20,24,10,-16,24,6,-16,24,-6,-20,24,-10],
// 4 16 -20 24 -10 -16 24 -6 16 24 -6 20 24 -10
  [4,16,-20,24,-10,-16,24,-6,16,24,-6,20,24,-10],
// 4 16 20 24 -10 16 24 -6 16 24 6 20 24 10
  [4,16,20,24,-10,16,24,-6,16,24,6,20,24,10],
// 1 16 0 24 0 20 0 0 0 -24 0 0 0 10 box4t.dat
  [1,16,0,24,0,20,0,0,0,-24,0,0,0,10, ldraw_lib__box4t(realsolid)],
// 1 16 10 0 0 1 0 0 0 1 0 0 0 1 stud.dat
  [1,16,10,0,0,1,0,0,0,1,0,0,0,1, ldraw_lib__stud(realsolid)],
// 1 16 -10 0 0 1 0 0 0 1 0 0 0 1 stud.dat
  [1,16,-10,0,0,1,0,0,0,1,0,0,0,1, ldraw_lib__stud(realsolid)],
// 0
];
module ldraw_lib__s__3004s01(step=0, col=false, unit=2/5, alt=false, line=0.2, solid=!$preview)
    makepoly(ldraw_lib__s__3004s01(solid), step=step, col=col, unit=unit, alt=alt, line=line, solid=solid);
ldraw_lib__s__3004s01(line=0.2);
// file: s/3005s01.scad
use <../../lib.scad>
use <../../p/box4t.scad>
use <../../p/box5.scad>
use <../../p/stud.scad>
$fa=1; $fs=0.2;
function ldraw_lib__s__3005s01(realsolid=false) = [
// 0 ~Brick  1 x  1 without Front Face
// 0 Name: s\3005s01.dat
// 0 Author: John Riley [jriley]
// 0 !LDRAW_ORG Subpart UPDATE 2004-01
// 0 !LICENSE Licensed under CC BY 2.0 and CC BY 4.0 : see CAreadme.txt
// 
// 0 BFC CERTIFY CCW
  [0,"BFC","CERTIFY"],
  [0,"BFC","CCW"],
// 
// 0 !HISTORY 2003-09-07 [jriley] BFCed & Subfiled
// 0 !HISTORY 2004-03-02 [PTadmin] Official Update 2004-01
// 0 !HISTORY 2007-08-29 [PTadmin] Header formatted for Contributor Agreement
// 0 !HISTORY 2008-07-01 [PTadmin] Official Update 2008-01
// 
// 
// 0 BFC INVERTNEXT
  [0,"BFC","INVERTNEXT"],
// 1 16 0 24 0 0 0 6 0 -20 0 -6 0 0 box5.dat
  [1,16,0,24,0,0,0,6,0,-20,0,-6,0,0, ldraw_lib__box5(realsolid)],
// 4 16 10 24 -10 6 24 -6 6 24 6 10 24 10
  [4,16,10,24,-10,6,24,-6,6,24,6,10,24,10],
// 4 16 10 24 10 6 24 6 -6 24 6 -10 24 10
  [4,16,10,24,10,6,24,6,-6,24,6,-10,24,10],
// 4 16 -10 24 10 -6 24 6 -6 24 -6 -10 24 -10
  [4,16,-10,24,10,-6,24,6,-6,24,-6,-10,24,-10],
// 4 16 -10 24 -10 -6 24 -6 6 24 -6 10 24 -10
  [4,16,-10,24,-10,-6,24,-6,6,24,-6,10,24,-10],
// 1 16 0 24 0 10 0 0 0 -24 0 0 0 10 box4t.dat
  [1,16,0,24,0,10,0,0,0,-24,0,0,0,10, ldraw_lib__box4t(realsolid)],
// 1 16 0 0 0 0 0 1 0 1 0 -1 0 0 stud.dat
  [1,16,0,0,0,0,0,1,0,1,0,-1,0,0, ldraw_lib__stud(realsolid)],
// 0
];
module ldraw_lib__s__3005s01(step=0, col=false, unit=2/5, alt=false, line=0.2, solid=!$preview)
    makepoly(ldraw_lib__s__3005s01(solid), step=step, col=col, unit=unit, alt=alt, line=line, solid=solid);
ldraw_lib__s__3005s01(line=0.2);
// file: 3004.scad
use <../lib.scad>
use <s/3004s01.scad>
$fa=1; $fs=0.2;
function ldraw_lib__3004(realsolid=false) = [
// 0 Brick  1 x  2
// 0 Name: 3004.dat
// 0 Author: James Jessiman
// 0 !LDRAW_ORG Part UPDATE 2022-05
// 0 !LICENSE Licensed under CC BY 2.0 and CC BY 4.0 : see CAreadme.txt
// 
// 0 BFC CERTIFY CCW
  [0,"BFC","CERTIFY"],
  [0,"BFC","CCW"],
// 
// 0 !HISTORY 2001-10-26 [PTadmin] Official Update 2001-01
// 0 !HISTORY 2002-05-07 {unknown} BFC Certification
// 0 !HISTORY 2002-06-11 [PTadmin] Official Update 2002-03
// 0 !HISTORY 2007-05-07 [PTadmin] Header formatted for Contributor Agreement
// 0 !HISTORY 2008-07-01 [PTadmin] Official Update 2008-01
// 0 !HISTORY 2022-08-04 [MagFors] Using subfile
// 0 !HISTORY 2022-09-15 [PTadmin] Official Update 2022-05
// 
// 
// 1 16 0 0 0 1 0 0 0 1 0 0 0 1 s\3004s01.dat
  [1,16,0,0,0,1,0,0,0,1,0,0,0,1, ldraw_lib__s__3004s01(realsolid)],
// 4 16 -20 24 -10 20 24 -10 20 0 -10 -20 0 -10
  [4,16,-20,24,-10,20,24,-10,20,0,-10,-20,0,-10],
];
module ldraw_lib__3004(step=0, col=false, unit=2/5, alt=false, line=0.2, solid=!$preview)
    makepoly(ldraw_lib__3004(solid), step=step, col=col, unit=unit, alt=alt, line=line, solid=solid);
ldraw_lib__3004(line=0.2);
// file: 3005.scad
use <../lib.scad>
use <s/3005s01.scad>
$fa=1; $fs=0.2;
function ldraw_lib__3005(realsolid=false) = [
// 0 Brick  1 x  1
// 0 Name: 3005.dat
// 0 Author: James Jessiman
// 0 !LDRAW_ORG Part UPDATE 2022-05
// 0 !LICENSE Licensed under CC BY 2.0 and CC BY 4.0 : see CAreadme.txt
// 
// 0 BFC CERTIFY CCW
  [0,"BFC","CERTIFY"],
  [0,"BFC","CCW"],
// 
// 0 !HISTORY 2001-10-26 [PTadmin] Official Update 2001-01
// 0 !HISTORY 2002-05-07 {unknown} BFC Certification
// 0 !HISTORY 2002-06-11 [PTadmin] Official Update 2002-03
// 0 !HISTORY 2007-05-07 [PTadmin] Header formatted for Contributor Agreement
// 0 !HISTORY 2008-07-01 [PTadmin] Official Update 2008-01
// 0 !HISTORY 2022-08-04 [MagFors] Using subfile
// 0 !HISTORY 2022-09-15 [PTadmin] Official Update 2022-05
// 
// 
// 1 16 0 0 0 1 0 0 0 1 0 0 0 1 s\3005s01.dat
  [1,16,0,0,0,1,0,0,0,1,0,0,0,1, ldraw_lib__s__3005s01(realsolid)],
// 4 16 -10 24 -10 10 24 -10 10 0 -10 -10 0 -10
  [4,16,-10,24,-10,10,24,-10,10,0,-10,-10,0,-10],
];
module ldraw_lib__3005(step=0, col=false, unit=2/5, alt=false, line=0.2, solid=!$preview)
    makepoly(ldraw_lib__3005(solid), step=step, col=col, unit=unit, alt=alt, line=line, solid=solid);
ldraw_lib__3005(line=0.2);
// main file
use <../lib.scad>
use <3005.scad>
$fa=1; $fs=0.2;
function ldraw_lib__35382(realsolid=false) = [
// 0 =Brick  1 x  1
// 0 Name: 35382.dat
// 0 Author: [PTadmin]
// 0 !LDRAW_ORG Part Alias UPDATE 2019-01
// 0 !LICENSE Licensed under CC BY 4.0 : see CAreadme.txt
// 
// 0 BFC CERTIFY CCW
  [0,"BFC","CERTIFY"],
  [0,"BFC","CCW"],
// 
// 0 !HISTORY 2019-06-28 [PTadmin] Official Update 2019-01
// 
// 
// 1 16 0 0 0 1 0 0 0 1 0 0 0 1 3005.dat
  [1,16,0,0,0,1,0,0,0,1,0,0,0,1, ldraw_lib__3005(realsolid)],
];
module ldraw_lib__35382(step=0, col=false, unit=2/5, alt=false, line=0.2, solid=!$preview)
    makepoly(ldraw_lib__35382(solid), step=step, col=col, unit=unit, alt=alt, line=line, solid=solid);
ldraw_lib__35382(line=0.2);
